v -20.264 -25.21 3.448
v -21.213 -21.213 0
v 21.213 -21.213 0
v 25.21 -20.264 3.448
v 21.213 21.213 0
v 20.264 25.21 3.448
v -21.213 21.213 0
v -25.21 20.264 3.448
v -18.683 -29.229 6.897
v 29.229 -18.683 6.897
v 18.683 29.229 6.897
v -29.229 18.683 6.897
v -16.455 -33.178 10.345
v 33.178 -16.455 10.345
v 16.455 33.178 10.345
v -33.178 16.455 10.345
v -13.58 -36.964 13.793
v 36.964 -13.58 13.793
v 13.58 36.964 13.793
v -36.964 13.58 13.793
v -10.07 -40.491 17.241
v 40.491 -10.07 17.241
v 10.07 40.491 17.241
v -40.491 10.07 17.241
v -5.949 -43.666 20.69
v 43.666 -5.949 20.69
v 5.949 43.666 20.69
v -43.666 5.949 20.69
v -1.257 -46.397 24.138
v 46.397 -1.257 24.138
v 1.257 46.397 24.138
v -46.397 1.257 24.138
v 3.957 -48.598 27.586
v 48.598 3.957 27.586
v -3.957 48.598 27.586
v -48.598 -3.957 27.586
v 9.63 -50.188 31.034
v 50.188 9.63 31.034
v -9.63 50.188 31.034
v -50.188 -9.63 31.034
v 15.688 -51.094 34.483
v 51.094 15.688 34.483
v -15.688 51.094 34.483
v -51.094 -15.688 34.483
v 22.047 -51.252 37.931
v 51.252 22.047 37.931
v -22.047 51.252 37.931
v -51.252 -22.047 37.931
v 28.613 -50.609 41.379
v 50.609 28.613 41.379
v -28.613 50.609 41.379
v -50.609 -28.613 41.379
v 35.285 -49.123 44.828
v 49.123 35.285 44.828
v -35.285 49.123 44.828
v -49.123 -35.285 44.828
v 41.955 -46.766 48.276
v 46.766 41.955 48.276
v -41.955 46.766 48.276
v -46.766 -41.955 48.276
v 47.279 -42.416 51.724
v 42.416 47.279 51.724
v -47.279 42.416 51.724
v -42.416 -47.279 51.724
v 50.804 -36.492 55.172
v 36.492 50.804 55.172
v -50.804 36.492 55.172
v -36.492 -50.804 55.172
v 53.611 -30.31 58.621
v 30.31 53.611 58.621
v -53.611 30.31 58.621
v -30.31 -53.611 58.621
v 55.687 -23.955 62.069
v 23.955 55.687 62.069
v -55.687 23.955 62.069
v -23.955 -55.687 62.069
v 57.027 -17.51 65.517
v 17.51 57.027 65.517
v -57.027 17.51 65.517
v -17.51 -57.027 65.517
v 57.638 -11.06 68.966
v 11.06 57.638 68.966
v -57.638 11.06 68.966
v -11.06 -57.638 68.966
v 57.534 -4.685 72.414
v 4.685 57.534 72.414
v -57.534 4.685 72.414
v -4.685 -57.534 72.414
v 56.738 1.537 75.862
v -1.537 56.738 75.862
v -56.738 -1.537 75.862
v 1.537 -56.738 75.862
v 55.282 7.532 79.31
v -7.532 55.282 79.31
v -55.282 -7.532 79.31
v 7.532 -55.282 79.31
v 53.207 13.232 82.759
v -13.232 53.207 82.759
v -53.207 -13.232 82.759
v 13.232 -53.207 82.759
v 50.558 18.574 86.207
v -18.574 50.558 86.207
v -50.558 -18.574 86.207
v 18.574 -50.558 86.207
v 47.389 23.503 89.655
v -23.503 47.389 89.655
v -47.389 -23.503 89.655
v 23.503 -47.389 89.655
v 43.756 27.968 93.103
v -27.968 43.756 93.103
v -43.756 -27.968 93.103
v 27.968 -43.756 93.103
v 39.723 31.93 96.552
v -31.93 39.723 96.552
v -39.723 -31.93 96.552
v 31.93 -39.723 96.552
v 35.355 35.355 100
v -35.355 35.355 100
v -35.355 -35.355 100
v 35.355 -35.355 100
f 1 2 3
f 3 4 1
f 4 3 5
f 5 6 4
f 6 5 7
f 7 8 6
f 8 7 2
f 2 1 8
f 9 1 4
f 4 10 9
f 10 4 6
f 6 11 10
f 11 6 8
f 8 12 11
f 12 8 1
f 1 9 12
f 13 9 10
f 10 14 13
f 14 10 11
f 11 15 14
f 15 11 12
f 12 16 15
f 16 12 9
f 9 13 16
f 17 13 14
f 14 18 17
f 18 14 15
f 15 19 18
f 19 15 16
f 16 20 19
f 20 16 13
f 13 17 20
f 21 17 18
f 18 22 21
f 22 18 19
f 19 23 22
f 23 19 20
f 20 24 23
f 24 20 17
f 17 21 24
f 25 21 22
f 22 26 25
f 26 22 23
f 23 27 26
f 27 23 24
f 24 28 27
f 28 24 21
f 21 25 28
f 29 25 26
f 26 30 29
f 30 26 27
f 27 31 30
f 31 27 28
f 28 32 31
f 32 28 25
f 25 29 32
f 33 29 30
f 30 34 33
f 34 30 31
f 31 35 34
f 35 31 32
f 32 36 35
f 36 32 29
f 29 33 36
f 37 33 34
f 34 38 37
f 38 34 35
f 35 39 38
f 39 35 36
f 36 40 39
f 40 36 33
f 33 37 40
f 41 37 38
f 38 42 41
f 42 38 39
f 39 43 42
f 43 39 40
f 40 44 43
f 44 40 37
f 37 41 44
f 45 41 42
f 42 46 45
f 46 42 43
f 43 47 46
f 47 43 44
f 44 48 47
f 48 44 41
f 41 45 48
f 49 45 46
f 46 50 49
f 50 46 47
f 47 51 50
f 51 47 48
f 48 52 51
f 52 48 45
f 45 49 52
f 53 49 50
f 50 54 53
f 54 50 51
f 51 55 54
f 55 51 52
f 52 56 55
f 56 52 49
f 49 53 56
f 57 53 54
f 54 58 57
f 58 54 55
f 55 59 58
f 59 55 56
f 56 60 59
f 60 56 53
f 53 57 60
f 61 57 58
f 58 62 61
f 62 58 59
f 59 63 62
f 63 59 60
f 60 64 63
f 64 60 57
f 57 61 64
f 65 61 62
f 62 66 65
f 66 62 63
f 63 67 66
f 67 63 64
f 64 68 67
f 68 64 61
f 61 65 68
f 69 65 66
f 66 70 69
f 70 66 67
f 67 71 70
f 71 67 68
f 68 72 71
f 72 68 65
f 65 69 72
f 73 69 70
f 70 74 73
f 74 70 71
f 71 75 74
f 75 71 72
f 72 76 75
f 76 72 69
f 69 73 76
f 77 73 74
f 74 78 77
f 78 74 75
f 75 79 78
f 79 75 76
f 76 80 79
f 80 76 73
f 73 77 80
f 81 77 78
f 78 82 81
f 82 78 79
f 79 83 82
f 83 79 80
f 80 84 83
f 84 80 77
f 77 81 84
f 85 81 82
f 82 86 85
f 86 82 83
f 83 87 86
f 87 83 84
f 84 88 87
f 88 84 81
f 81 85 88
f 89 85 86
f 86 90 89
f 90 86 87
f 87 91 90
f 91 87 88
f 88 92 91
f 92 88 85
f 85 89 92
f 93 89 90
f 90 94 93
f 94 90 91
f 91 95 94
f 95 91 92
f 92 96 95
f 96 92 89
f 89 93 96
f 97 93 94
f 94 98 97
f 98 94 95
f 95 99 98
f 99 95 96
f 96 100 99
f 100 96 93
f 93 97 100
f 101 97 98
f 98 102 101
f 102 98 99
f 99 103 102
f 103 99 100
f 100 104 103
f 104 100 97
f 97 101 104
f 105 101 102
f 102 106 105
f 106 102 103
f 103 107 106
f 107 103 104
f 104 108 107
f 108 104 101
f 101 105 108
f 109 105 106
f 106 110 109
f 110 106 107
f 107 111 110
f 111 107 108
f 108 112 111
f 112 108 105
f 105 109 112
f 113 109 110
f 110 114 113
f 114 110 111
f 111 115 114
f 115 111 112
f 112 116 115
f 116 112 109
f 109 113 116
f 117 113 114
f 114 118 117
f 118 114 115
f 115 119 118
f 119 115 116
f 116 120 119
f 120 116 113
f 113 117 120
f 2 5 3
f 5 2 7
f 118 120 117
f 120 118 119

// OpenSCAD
// The vase profile will range from the left edge of the drawing square (=center of vase) to the right side of the drawing.
rightHandProfile = [ [ [-35,-25],[-18,0],[-25,25] ], [[0,1,2]] ]; // [draw_polygon:100x100]
crossSection = [ [ [-25,-25], [25,-25], [25,25], [-25,25] ], [[0,1,2,3]] ]; // [draw_polygon:100x100]
twistAngle = 180;
numberOfSections = 30;
actualHeight = 100;
forceDegreesOfRotationalSymmetry = 1;
mirrorInXAxis = 0; //[0:No,1:Yes]

module end_of_parameters_dummy() {}


//BEGIN: use <tubemesh.scad>

//BEGIN: use <eval.scad>;
function _isString(v) = v >= "";
function _isVector(v) = !(v>="") && len(v) != undef;
function _isFloat(v) = v+0 != undef;

function _substr(s, start=0, stop=undef, soFar = "") =
    start >= (stop==undef ? len(s) : stop) ? soFar :
        _substr(s, start=start+1, stop=stop, soFar=str(soFar, s[start]));

function _parseInt(s, start=0, stop=undef, accumulated=0) =
    let( stop = stop==undef ? len(s) : stop )
        start >= stop ? accumulated :
        s[start] == "+" ? _parseInt(s, start=start+1, stop=stop) :
        s[start] == "-" ? -_parseInt(s, start=start+1, stop=stop) :
        let (digit = search(s[start], "0123456789"))
            digit == [] ? 0 : _parseInt(s, start=start+1, stop=stop, accumulated=accumulated*10+digit[0]);

function _findNonDigit(s, start=0) =
    start >= len(s) || s[start]<"0" || s[start]>"9" ? start :
    _findNonDigit(s, start=start+1);

function _replaceChar(s,c1,c2,pos=0,soFar="") =
    pos >= len(s) ? soFar :
    _replaceChar(s,c1,c2,pos=pos+1,soFar=str(soFar, s[pos]==c1 ? c2 : s[pos]));

function _parseUnsignedFloat(s) =
    len(s) == 0 ? 0 :
        let(
            firstNonDigit = _findNonDigit(s),
            decimalPart = s[firstNonDigit]!="." ?
                [firstNonDigit,firstNonDigit] : [firstNonDigit+1, _findNonDigit(s, start=firstNonDigit+1)],
            intPart = _parseInt(s,start=0,stop=firstNonDigit),
            fractionPart = _parseInt(s,start=decimalPart[0],stop=decimalPart[1]),
            baseExp = s[decimalPart[1]]=="e" || s[decimalPart[1]]=="E" ? pow(10,_parseInt(s, start=decimalPart[1]+1)) : 1)
            (intPart+fractionPart*pow(10,-(decimalPart[1]-decimalPart[0])))*baseExp;

function _tail(v) = len(v)>=2 ? [for(i=[1:len(v)-1]) v[i]] : [];
function _isspace(c) = (" " == c || "\t" == c || "\r" == c || "\n" == c );
function _isdigit(c) = ("0" <= c && c <= "9" );
function _isalpha(c) = ("a" <= c && c <= "z") || ("A" <= c && c <= "Z");
function _isalpha_(c) = _isalpha(c)  || c=="_";
function _isalnum_(c) = _isalpha(c) || _isdigit(c) || c=="_";
function _flattenLists(ll) = [for(a=ll) for(b=a) b];

function _spaceSequence(s, start=0, count=0) =
    len(s)>start && _isspace(s[start]) ? _spaceSequence(s, start=start+1, count=count+1) : count;
function _digitSequence(s, start=0, count=0) =
    len(s)>start && _isdigit(s[start]) ? _digitSequence(s, start=start+1,count=count+1) : count;
function _alnum_Sequence(s, start=0, count=0) =
    len(s)>start && _isalnum_(s[start]) ? _alnum_Sequence(s, start=start+1,count=count+1) : count;
function _identifierSequence(s, start=0, count=0) =
    len(s)>start && _isalpha_(s[start]) ? _alnum_Sequence(s, start=start+1, count=count+1) : count;
function _signedDigitSequence(s, start=0) =
    len(s) <= start ? 0 :
        (s[start] == "+" || s[start] == "-" ) ? 1+_digitSequence(s,start=start+1) : _digitSequence(s,start=start);
function _realStartingWithDecimal(s, start=0) =
    len(s)>start && s[start] == "." ?
        let(next = start+1+_digitSequence(s, start=start+1))
        (s[next] == "e" || s[next] == "E" ?
            next-start+1+_signedDigitSequence(s, start=next+1) : next-start)
        : 0;
function _realContinuation(s, start=0) =
    len(s) <= start ? 0 :
        let(c1=_realStartingWithDecimal(s, start=start))
        c1 > 0 ? c1 :
        s[start] == "e" || s[start] == "E" ?
            1+_signedDigitSequence(s, start=start+1) : 0;
function _positiveRealSequence(s, start=0) =
    len(s) <= start ? 0 :
        let(c1 = _realStartingWithDecimal(s, start=start))
            c1 > 0 ? c1 :
        let(c2 = _digitSequence(s, start=start))
            c2 > 0 ? c2 + _realContinuation(s, start=start+c2) : 0;

_multiSymbolOperators = [ "<=", ">=", "==", "&&", "||" ]; // must be in order of decreasing length

function _multiSymbolOperatorSequence(s, start=0) =
    (s[start]=="<" && s[start+1]=="=") ||
    (s[start]==">" && s[start+1]=="=") ||
    (s[start]=="=" && s[start+1]=="=") ||
    (s[start]=="!" && s[start+1]=="=") ||
    (s[start]=="&" && s[start+1]=="&") ||
    (s[start]=="|" && s[start+1]=="|") ? 2 : 0;

function _tokenize(s, start=0) =
    start >= len(s) ? [] :
    let(c1=_spaceSequence(s, start=start)) c1>0 ?
        concat([" "], _tokenize(s, start=start+c1)) :
    let(c2=_identifierSequence(s, start=start)) c2>0 ?
        concat([_substr(s, start=start, stop=start+c2)], _tokenize(s, start=start+c2)) :
    let(c3=_positiveRealSequence(s, start=start)) c3>0 ?
        concat([_substr(s, start=start, stop=start+c3)], _tokenize(s, start=start+c3)) :
    let(c4=_multiSymbolOperatorSequence(s, start=start)) c4>0 ?
        concat([_substr(s, start=start, stop=start+c4)], _tokenize(s, start=start+c4)) :
        concat([s[start]], _tokenize(s, start=start+1));


function _endParens(list,start=0,openCount=0,stop=undef) =
    let(stop = stop==undef ? len(list) : stop)
    start >= stop ? (openCount?undef:stop) :
    list[start][0] == ")" ?
            (openCount==1 ? start+1 : _endParens(list,start+1,stop=stop, openCount=openCount-1)) :
    _endParens(list,start+1,stop=stop, openCount=
        list[start][0] == "(" ?
            openCount+1 : openCount);

function _indexInTable(string, table, column=0) =
    let (s=search([string], table, index_col_num=column))
        s[0] == [] ? -1 : s[0][0];

_NAME = 0;
_ARITY = 1;
_PREC = 2;
_ASSOC_DIR = 3;
_ARGUMENTS_FROM_VECTOR = 4;
_OPERATOR = 5;
_EXTRA_DATA = 6;

function _func(op) = [ op, 1, -1, 1, true, op ];

_operators = [
    [ "[", 1, -1, 1, true, "[" ],
    [ "pow", 1, -1, 1, true, "^" ],
    [ "cross", 1, -1, 1, true, "cross" ],
    _func("sqrt"),
    _func("cos"),
    _func("sin"),
    _func("tan"),
    _func("acos"),
    _func("asin"),
    _func("atan"),
    _func("COS"),
    _func("SIN"),
    _func("TAN"),
    _func("ACOS"),
    _func("ASIN"),
    _func("ATAN"),
    _func("abs"),
    _func("ceil"),
    _func("exp"),
    _func("floor"),
    _func("ln"),
    _func("log"),
    _func("round"),
    _func("sign"),
    _func("norm"),
    [ "atan2", 1, -1, 1, true, "atan2" ],
    [ "ATAN2", 1, -1, 1, true, "ATAN2" ],
    [ "max", 1, -1, 1, true, "max" ],
    [ "min", 1, -1, 1, true, "min" ],
    [ "concat", 1, -1, 1, true, "concat" ],
    [ "#", 2, 0, -1, false, "#" ],
    [ "^", 2, 0, -1, false, "^" ],
    [ "#-",1, 0.5, 0, true, "-" ],
    [ "#+",1, 0.5, 0, true, "+" ],
    [ "*", 2, 1, 1, false, "*" ],
    [ "/", 2, 1, 1, false, "/" ],
    [ "%", 2, 1, 1, false, "%" ],
    [ "+", 2, 2, 1, true, "+" ],
    [ "-", 2, 2, 1, true, "-" ],
    [ "!=", 2, 3, 1, true, "!=" ],
    [ "==", 2, 3, 1, true, "==" ],
    [ "<=", 2, 3, 1, true, "<=" ],
    [ ">=", 2, 3, 1, true, ">=" ],
    [ "<", 2, 3, 1, true, "<" ],
    [ ">", 2, 3, 1, true, ">" ],
    [ "!", 1, 4, 1, true, "!" ],
    [ "&&", 2, 5, 1, true, "&&" ],
    [ "||", 2, 5, 1, true, "||" ],
    [ "?", 2, 10, -1, true, "?" ],
    [ ":", 2, 10, -1, true, ":" ],
    [ "=", 2, 30, 1, true, "=" ], // for let()
    [ "let", 1, 25, 1, true, "let" ],
    [ ",", 2, 100, 1, true, "," ]
   ];

_binary_or_unary = [ ["-", "#-"], ["+", "#+"], ["#", "["] ];

// insert parentheses in some places to tweak the order of
// operations in those contexts
function _fixBrackets(pretok,start=0) =
    start >= len(pretok) ? [] :
    pretok[start] == "[" ?
        concat(["#", "("], _fixBrackets(pretok,start=start+1)) :
    pretok[start] == "]" ?
        concat([")"], _fixBrackets(pretok,start=start+1)) :
    pretok[start] == "?" ?
        concat([pretok[start],"("], _fixBrackets(pretok,start=start+1)) :
    pretok[start] == ":" ?
        concat([")",pretok[start]], _fixBrackets(pretok,start=start+1)) :
        concat(pretok[start], _fixBrackets(pretok,start=start+1));

// disambiguate operators that can be unary or binary
function _fixUnaries(pretok) =
    [ for (i=[0:len(pretok)-1])
         let (
            a = pretok[i],
            j=_indexInTable(a, _binary_or_unary))
            (0 <= j && (i == 0 || pretok[i-1] == "(" ||
                0 <= _indexInTable(pretok[i-1], _operators)))? _binary_or_unary[j][1] : a ];

function _fixLet1(tok, start=0, stop=undef) =
    let (stop = stop==undef ? len(tok) : stop)
        start >= stop ? [] :
        tok[start][0] == "let"?
           let(endP=_endParens(tok,start=start+1,stop=stop,openCount=0)) concat([concat(tok[start], [_fixLet1(tok,start=start+2,stop=endP-1)])], _fixLet1(tok,start=endP,stop=stop)) :
        concat([tok[start]], _fixLet1(tok,start=start+1,stop=stop));

function _parsePass1(s) =
    let (pretok=_fixUnaries(_fixBrackets(_tokenize(s))))
    _fixLet1(
    [ for (i=[0:len(pretok)-1])
        let (a=pretok[i])
        if (a[0] != " ")
            let (j=_indexInTable(a, _operators))
                j >= 0 ? _operators[j] : [a] ] );

function _prec(op1, pos1, op2, pos2) =
    op1 != undef && op2 == undef ? false :
    op1 == undef && op2 != undef ? true :
    op1 == undef && op2 == undef ? true :
    op1[_ARITY] == 1 && pos1 > pos2 ? true :
    op2[_ARITY] == 1 && pos2 > pos1 ? false :
    op1[_PREC] < op2[_PREC] ? true :
        op2[_PREC] < op1[_PREC] ? false :
            op1[_ASSOC_DIR] * pos1 < op2[_ASSOC_DIR] * pos2;

function _parseLiteralOrVariable(s) =
        s == "PI" ? PI :
        s == "true" ? true :
        s == "false" ? false :
        s == "undef" ? undef :
        _isalpha_(s[0]) ? s :
        _parseUnsignedFloat(s);

function _isoperator(token) = _PREC<len(token);

function _getCandidatesForMainOperator(tok,start,stop) =
   start >= stop ? [] :
   tok[start][0] == "(" ?
        _getCandidatesForMainOperator(tok,_endParens(tok,start=start+1,stop=stop,openCount=1),stop)
        :
        _isoperator(tok[start]) ? concat([[tok[start],start]],_getCandidatesForMainOperator(tok,start+1,stop)) :
        _getCandidatesForMainOperator(tok,start+1,stop);

// Find the operator with least precedence
function _findMainOperatorPos(candidates,start=0) =
    len(candidates) <= start ? undef :
    let(rest=_findMainOperatorPos(candidates,start+1))
    _prec(candidates[rest][0], rest, candidates[start][0], start) ? start : rest;

function _firstOccurrence(c,opName,start=0) =
    start >= len(c) ? undef :
    c[start][0][0] == opName ? c[start] :
        _firstOccurrence(c,opName,start=start+1);

// We know the main operator is a ? or a :. We now need to find out which.
function _mainQuestionOperator(c) =
    let(fq = _firstOccurrence(c,"?"),
        fc = _firstOccurrence(c,":"))
        fq[1] != undef && (fc[1] == undef || fq[1] < fc[1]) ? fq : fc;

function _mainOperator(tok,start,stop) =
    let(c=_getCandidatesForMainOperator(tok,start,stop),
        pos=_findMainOperatorPos(c),
        m=c[pos])
        m[0][0] == "?" ?
            concat(m, [_firstOccurrence(c,":",start=pos+1)[1]])
            : m;

function _doLets(assignments, final, start=0) =
    start >= len(assignments) ? final :
    assignments[start][0] == "=" ? ["let", ["'", assignments[start][1]], assignments[start][2], _doLets(assignments, final, start=start+1)] : _doLets(assignments, final, start=start+1);

function _letOperator(a,b) =
    let(rawAssignments=_fixCommas(a),
        assignments=rawAssignments[0] == "[[" ?
            _tail(rawAssignments) : [a])
    _doLets(assignments, b);

/* This takes a fully tokenized vector, each element of which is either a line from the _operators table or a vector containing a single non-operator string, and parses it using general parenthesis and operator parsing. Comma expressions for building vectors will be parsed in the next pass. */
function _parseMain(tok,start=0,stop=undef) =
    let( stop= stop==undef ? len(tok) : stop )
        stop <= start ? undef :
        tok[start][0] == "(" && _endParens(tok,start=start+1,stop=stop,openCount=1)==stop ?
            _parseMain(tok,start=start+1,stop=stop-1) :
        let( lp = _mainOperator(tok,start,stop) )
            lp[0] == undef ? ( stop-start>1 ? undef : _parseLiteralOrVariable(tok[start][0]) ) :
            let( op = lp[0], pos = lp[1] )
                op[_NAME] == "?" ?
                    [ op[_OPERATOR], _parseMain(tok,start=start,stop=pos), _parseMain(tok,start=pos+1,stop=lp[2]), _parseMain(tok,start=lp[2]+1,stop=stop) ] :
                op[_NAME] == "let" ?
                    _letOperator( _parseMain(op[_EXTRA_DATA]), _parseMain(tok,start=pos+1,stop=stop)) :
                op[_ARITY] == 2 ?
                    (start==pos ?
                    /* unary */

                    let(j=_indexInTable(op[_OPERATOR], _binary_or_unary)) [ _binary_or_unary[j][1],_parseMain(tok,start=pos+1,stop=stop)] : [ op[_OPERATOR], _parseMain(tok,start=start,stop=pos), _parseMain(tok,start=pos+1,stop=stop)])
                    : [ op[_OPERATOR], _parseMain(tok,start=pos+1,stop=stop) ];


// this upgrades sequences of binary commas to vectors
function _fixCommas(expression) =
    expression[0] == "," ?
        let(a=_fixCommas(expression[1]),
            b=_fixCommas(expression[2]))
            a[0] == "[[" ?
                concat(["[["],concat(_tail(a), [b])) :
                ["[[",a,b]
        :
    _isVector(expression) ?
            concat([expression[0]], [for (i=[1:len(expression)-1]) _fixCommas(expression[i])]) :
            expression;

// fix arguments from vectors
function _fixArguments(expression) =
    let(i=_indexInTable(expression[0], _operators, _OPERATOR))
            i >=0 && _operators[i][_ARGUMENTS_FROM_VECTOR] && expression[1][0] == "[[" ? concat([expression[0]], [for (i=[1:len(expression[1])-1]) _fixArguments(expression[1][i])]) :
/*            expression[0] == "?" ?
                concat([expression[0],expression[1]],[for (i=[1:len(expression[2])-1]) _fixArguments(expression[2][i])]) : */
            len(expression)>1 && !_isString(expression) ?
                concat([expression[0]], [for (i=[1:len(expression)-1]) _fixArguments(expression[i])])
                    : expression;

function _optimizedLiteral(x) =
    len(x)==undef ? x : ["'", x];

function _wellDefined(x) =
    x==undef ? false :
    len(x)==undef ? true :
    x[0] == "'" ? true :
    len(x)==1 ? x[0]!=undef :
    len([for (a=x) if(!_wellDefined(a)) true])==0;

function _optimize(expression) =
    let(x=eval(expression,$careful=true))
        _wellDefined(x) ? _optimizedLiteral(x) :
        expression[0] == "'" ? _optimizedLiteral(x) :
        ! _isString(expression) ?
            concat([expression[0]], [for(i=[1:len(expression)-1]) (i>1 || expression[0] != "let") ?  _optimize(expression[i]) : expression[i]]) :
        expression;

function compileFunction(expression,optimize=true) =
            _isVector(expression) ? expression :
            _isFloat(expression) ? expression :
            let(unoptimized = _fixArguments(_fixCommas(_parseMain(_parsePass1(expression)))))
        optimize ? _optimize(unoptimized) : unoptimized;

function evaluateFunction(expression,variables) = eval(compileFunction(expression,optimize=false),variables);

function _let(v, var, value) = concat([var, value], v);

function _lookupVariable(var, table) =
    let (s=search([var], table, index_col_num=0))
        s[0] == [] ? undef : table[s[0][0]][1];

function _generate(var, range, expr, v) =
    [ for(i=range) eval(expr, _let(v, var, i)) ];

function _safeNorm(v) =
    ! _isVector(v) || len([for (x=v) x+0==undef]) ? undef : norm(v);

function eval(c,v=[]) =
    ""<=c ? _lookupVariable(c,v) :
    let(op=c[0]) (
    op == undef ? c :
    op == "'" ? c[1] :
    op == "+" ? (len(c)==2 ? eval(c[1],v) : eval(c[1],v)+eval(c[2],v)) :
    op == "-" ? (len(c)==2 ? -eval(c[1],v) : eval(c[1],v)-eval(c[2],v)) :
    op == "*" ? eval(c[1],v)*eval(c[2],v) :
    op == "/" ? eval(c[1],v)/eval(c[2],v) :
    op == "%" ? eval(c[1],v)%eval(c[2],v) :
    op == "sqrt" ? sqrt(eval(c[1],v)) :
    op == "^" || op == "pow" ? pow(eval(c[1],v),eval(c[2],v)) :
    op == "cos" ? cos(eval(c[1],v)) :
    op == "sin" ? sin(eval(c[1],v)) :
    op == "tan" ? tan(eval(c[1],v)) :
    op == "acos" ? acos(eval(c[1],v)) :
    op == "asin" ? asin(eval(c[1],v)) :
    op == "atan" ? atan(eval(c[1],v)) :
    op == "atan2" ? atan2(eval(c[1],v),eval(c[2],v)) :
    op == "COS" ? cos(eval(c[1],v)*180/PI) :
    op == "SIN" ? sin(eval(c[1],v)*180/PI) :
    op == "TAN" ? tan(eval(c[1],v)*180/PI) :
    op == "ACOS" ? acos(eval(c[1],v))*PI/180 :
    op == "ASIN" ? asin(eval(c[1],v))*PI/180 :
    op == "ATAN" ? atan(eval(c[1],v))*PI/180 :
    op == "ATAN2" ? atan2(eval(c[1],v),eval(c[2],v))*PI/180 :
    op == "abs" ? abs(eval(c[1],v)) :
    op == "ceil" ? ceil(eval(c[1],v)) :
    op == "cross" ? cross(eval(c[1],v),eval(c[2],v)) :
    op == "exp" ? exp(eval(c[1],v)) :
    op == "floor" ? floor(eval(c[1],v)) :
    op == "ln" ? ln(eval(c[1],v)) :
    op == "len" ? len(eval(c[1],v)) :
    op == "log" ? log(eval(c[1],v)) :
    op == "max" ? (len(c) == 2 ? max(eval(c[1],v)) : max([for(i=[1:len(c)-1]) eval(c[i],v)])) :
    op == "min" ? (len(c) == 2 ? min(eval(c[1],v)) : min([for(i=[1:len(c)-1]) eval(c[i],v)])) :
    op == "norm" ?
        (!$careful ? norm(eval(c[1],v)) : _safeNorm(eval(c[1],v))) :
    op == "rands" ? rands(eval(c[1],v),eval(c[2],v),eval(c[3],v),eval(c[4],v)) :
    op == "round" ? round(eval(c[1],v)) :
    op == "sign" ? sign(eval(c[1],v)) :
    op == "[" ? [for (i=[1:len(c)-1]) eval(c[i],v)] :
    op == "#" ? eval(c[1],v)[eval(c[2],v)] :
    op == "<" ? eval(c[1],v)<eval(c[2],v) :
    op == "<=" ? eval(c[1],v)<=eval(c[2],v) :
    op == ">=" ? eval(c[1],v)>=eval(c[2],v) :
    op == ">" ? eval(c[1],v)>=eval(c[2],v) :
    op == "==" ? (!$careful ? eval(c[1],v)==eval(c[2],v) :
        (let(c1=eval(c[1],v))
        c1==undef ? undef :
        let(c2=eval(c[2],v))
        c2==undef ? undef :
        c1 == c2) ) :
    op == "!=" ? (!$careful ? eval(c[1],v)!=eval(c[2],v) :
        (let(c1=eval(c[1],v))
        c1==undef ? undef :
        let(c2=eval(c[2],v))
        c2==undef ? undef :
        c1 != c2) ) :
    op == "&&" ? (!$careful ? eval(c[1],v)&&eval(c[2],v) :
        (let(c1=eval(c[1],v))
        c1==undef ? undef :
        !c1 ? false :
        let(c2=eval(c[2],v))
        c2==undef ? undef :
        c1 && c2) ) :
    op == "||" ? (!$careful ? eval(c[1],v)||eval(c[2],v) :
        (let(c1=eval(c[1],v))
        c1==undef ? undef :
        c1 ? true :
        let(c2=eval(c[2],v))
        c2==undef ? undef :
        c1 || c2) ) :
    op == "!" ? (!$careful ? !eval(c[1],v) :
        (let(c1=eval(c[1],v))
        c1==undef ? undef :
        !c1) ) :
    op == "?" ? (!$careful ? (eval(c[1],v)?eval(c[2],v):eval(c[3],v)) :
        (let(c1=eval(c[1],v))
        c1==undef ? undef :
        c1 ? eval(c[2],v):eval(c[3],v)) ):

    op == "concat" ? [for (i=[1:len(c)-1]) let(vect=eval(c[i],v)) for(j=[0:len(vect)-1]) vect[j]] :
    op == "range" ? (len(c)==3 ? [eval(c[1],v):eval(c[2],v)] : [eval(c[1],v):eval(c[2],v):eval(c[3],v)]) :
    op == "let" ? (!$careful ? eval(c[3],concat([[eval(c[1],v),eval(c[2],v)]], v)) :
            let(c1=eval(c[1],v),c2=eval(c[2],v))
                c1==undef || c2==undef ? undef :
                    eval(c[3],concat([[c1,c2]], v)) ) :
    op == "gen" ? _generate(eval(c[1],v),eval(c[2],v),c[3],v) :
    undef
    );

// per 10,000 operations with "x^3*y-x*y^3"
// 24 sec compile
// 21 sec unoptimized compile
// 22 sec evaluateFunction()
// 0.7 sec eval

// pass1 10 seconds [tokenize: 4 seconds]
// parseMain 6
// fixCommas 0
// fixArguments 3
// optimize 3
/*
echo(compileFunction("x^(2*3)"));
fc = compileFunction("x^3*y-x*y^3",optimize=true);
echo(fc);
echo(eval(fc,[["x",1],["y",1]]));
z=[for(i=[0:9999]) compileFunction("x^3*y-x*y^3",optimize=false)];//fc,[ ["x",1],["y",2] ])];
*/

//z = [for(i=[1:10000]) compileFunction("x^3*y-x*y^3")];
// normal: 23

//function repeat(s, copies, soFar="") = copies <= 0 ? soFar : repeat(s, copies-1, soFar=str(soFar,s));

//END: use <eval.scad>;


// params = [sections,sectionCounts]

// written for tail-recursion
// _subtotals[i] = list[0] + ... + list[i-1]
function _subtotals(list,soFar=[]) =
        len(soFar) >= 1+len(list) ? soFar :
        _subtotals(list,
            let(n1=len(soFar))
            concat(soFar, n1>0 ? soFar[n1-1]+list[n1-1] : 0));

function _flatten(list) = [for (a=list) for(b=a) b];

function _reverseTriangle(t) = [t[2], t[1], t[0]];

// smallest angle in triangle
function _minAngle(p1,p2,p3) =
    let(a = p2-p1,
        b = p3-p1,
        c = p3-p2,
        v1 = a*b,
        v2 = -(c*a))
        v1 == 0 || v2 == 0 ? 0 :
        let( na = norm(a),
             a1 = acos(v1 / (na*norm(b))),
             a2 = acos(v2 / (na*norm(c))) )
        min(a1,a2,180-(a1+a2));

// triangulate square to maximize smallest angle
function _doSquare(points,i11,i21,i22,i12,optimize=true) =
    points[i11]==points[i12] ? [[i11,i21,i22]] :
    points[i21]==points[i22] ? [[i22,i12,i11]] :
    !optimize ? [[i11,i21,i22], [i22,i12,i11]] :
    let (m1 = min(_minAngle(points[i11],points[i21],points[i22]), _minAngle(points[i22],points[i12],points[i11])),
        m2 = min(_minAngle(points[i11],points[i21],points[i12]),
                _minAngle(points[i21],points[i22],points[i12])) )
        m2 <= m1 ? [[i11,i21,i22], [i22,i12,i11]] :
                  [[i11,i21,i12], [i21,i22,i12]];

/*
function _inTriangle(v1,t) = (v1==t[0] || v1==t[1] || v1==t[2]);

function _findTheDistinctVertex(t1,t2) =
    let(in = [for(i=[0:2]) _inTriangle(t1[i],t2)])
    ! in[0] && in[1] && in[2] ? 0 :
    ! in[1] && in[0] && in[2] ? 1 :
    ! in[2] && in[0] && in[1] ? 2 :
    undef;

// make vertex i come first
function _rotateTriangle(t,i) =
    [for (j=[0:2]) t[(j+i)%3]];

function _optimize2Triangles(points,t1,t2) =
    let(i1 = _findTheDistinctVertex(t1,t2))
    i1 == undef ? [t1,t2] :
    let(i2 = _findTheDistinctVertex(t2,t1))
    i2 == undef ? [t1,t2] :
    let(t1 = _rotateTriangle(t1,i1),
        t2 = _rotateTriangle(t2,i2))
    _doSquare(points,t1[1],t2[0],t2[1],t1[0],optimize=true);

// a greedy optimization for a strip of triangles most of which adjoin one another; written for tail-recursion
function _optimizeTriangles(points,triangles,position=0,optimize=true,iterations=4) =
        !optimize || position >= iterations*len(triangles) ? triangles :
            _optimizeTriangles(points,
                let(
                    n = len(triangles),
                    position1=position%n,
                    position2=(position+1)%n,
                    opt=_optimize2Triangles(points,triangles[position1],triangles[position2]))
                    [for (i=[0:len(triangles)-1])
                        i == position1 ? opt[0] :
                        i == position2 ? opt[1] :
                            triangles[i]],
                position=position+1);
*/

function _removeEmptyTriangles(points,triangles) =
    [for(t=triangles)
        if(true || points[t[0]] != points[t[1]] && points[t[1]] != points[t[2]] && points[t[2]] != points[t[0]]) t];

// n1 and n2 should be fairly small, so this doesn't need
// tail-recursion
// this assumes n1<=n2
function _tubeSegmentTriangles(points,index1,n1,index2,n2,i=0,soFar=[],optimize=true)
    = i>=n2 ? _removeEmptyTriangles(points,soFar) :
            let(i21=i,
                i22=(i+1)%n2,
                i11=floor((i21)*n1/n2+0.5)%n1,
                i12=floor((i22)*n1/n2+0.5)%n1,
                add = i11==i12 ? [[index1+i11,index2+i21,index2+i22]] :
                    _doSquare(points,index1+i11,index2+i21,index2+i22,index1+i12,optimize=optimize))
                _tubeSegmentTriangles(points,index1,n1,index2,n2,i=i+1,soFar=concat(soFar,add),optimize=optimize);

function _tubeSegmentFaces(points,index,n1,n2,optimize=true)
    = n1<n2 ? _tubeSegmentTriangles(points,index,n1,index+n1,n2,optimize=optimize) :
        [for (f=_tubeSegmentTriangles(points,index+n1,n2,index,n1,optimize=optimize)) _reverseTriangle(f)];

function _tubeMiddleFaces(points,counts,subtotals,optimize=true) = [ for (i=[1:len(counts)-1])
           for (face=_tubeSegmentFaces(points,subtotals[i-1],counts[i-1],counts[i],optimize=optimize)) face ];

function _endCaps(counts,subtotals,startCap=true,endCap=true) =
    let( n = len(counts),
         cap1 = counts[0]<=2 || !startCap ? undef : [for(i=[0:counts[0]-1]) i],
         cap2 = counts[n-1]<=2 || !endCap ? undef : [for(i=[counts[n-1]-1:-1:0]) subtotals[n-1]+i] )
       [for (c=[cap1,cap2]) if (c!=undef) c];

function _tubeFaces(sections,startCap=true,endCap=true,optimize=true) =
                let(
        counts = [for (s=sections) len(s)],
        points = _flatten(sections),
        subtotals = _subtotals(counts))
            concat(_tubeMiddleFaces(points,counts,subtotals,optimize=optimize),_endCaps(counts,subtotals,startCap=true,endCap=true));

function _removeDuplicates1(points,soFar=[[],[]]) =
        len(soFar[0]) >= len(points) ? soFar :
            _removeDuplicates1(points,
               let(
                mapSoFar=soFar[0],
                pointsSoFar=soFar[1],
                j=len(mapSoFar),
                k=search([points[j]], pointsSoFar)[0])
                k == []? [concat(mapSoFar,[len(pointsSoFar)]),
                            concat(pointsSoFar,[points[j]])] :
                           [concat(mapSoFar,[k]),pointsSoFar]);

function _removeDuplicates(points, faces) =
    let(fix=_removeDuplicates1(points),
        map=fix[0],
        newPoints=fix[1],
        newFaces=[for(f=faces) [for(v=f) map[v]]])
            [newPoints, newFaces];

function pointsAndFaces(sections,startCap=true,endCap=true,optimize=true) =
        let(
            points0=_flatten(sections),
            faces0=_tubeFaces(sections,startCap=startCap,endCap=endCap,optimize=optimize))
        _removeDuplicates(points0,faces0);

function sectionZ(section,z) = [for(xy=section) [xy[0],xy[1],z]];

function shiftSection(section,delta) = [for(p=section) [for(i=[0:len(delta)-1]) (p[i]==undef?0:p[i])+delta[i]]];

module tubeMesh(sections,startCap=true,endCap=true,optimize=true) {
    pAndF = pointsAndFaces(sections,startCap=startCap,endCap=endCap,optimize=optimize);
    polyhedron(points=pAndF[0],faces=pAndF[1]);
}

// increase number of points from len(section) to n
function _interpolateSection(section,n) =
        let(m=len(section))
        n == m ? section :
        n < m ? undef :
            [for(i=[0:m-1])
                let(cur=floor(i*n/m),
                    k=floor((i+1)*n/m)-cur,
                    i2=(i+1)%m)
                    for(j=[0:k-1])
                        let(t=j/k)
                            section[i]*(1-t)+section[i2]*t];

function arcPoints(r=10,d=undef,start=0,end=180,z=undef) =
            let(r=d==undef?r:d/2,
                n=getPointsAround(abs(end-start)))
                    r*[for(i=[0:n])
                        let(angle=start+i*(end-start)/n) [cos(angle),sin(angle)]];

function ngonPoints(n=4,r=10,d=undef,rotate=0,z=undef) =
            let(r=d==undef?r:d/2)
            z==undef ?
            r*[for(i=[0:n-1]) let(angle=i*360/n+rotate) [cos(angle),sin(angle)]] :
            [for(i=[0:n-1]) let(angle=i*360/n+rotate) [r*cos(angle),r*sin(angle),z]];

function starPoints(n=10,r1=5,r2=10,rotate=0,z=undef) =
          z==undef ?
            [for(i=[0:2*n-1]) let(angle=i*180/n+rotate) (i%2?r1:r2) * [cos(angle),sin(angle)]] :
            [for(i=[0:2*n-1]) let(angle=i*180/n+rotate, r=i%2?r1:r2) [r*cos(angle),r*sin(angle),z]];

function roundedSquarePoints(size=[10,10],radius=2,z=undef) =
    let(n=$fn?$fn:32,
        x=len(size)>=2 ? size[0] : size,
        y=len(size)>=2 ? size[1] : size,
        centers=[[x-radius,y-radius],[radius,y-radius],[radius,radius],[x-radius,radius]],
        section=[for(i=[0:n-1])
            let(center=centers[floor(i*4/n)],
                angle=360*i/n)
            center+radius*[cos(angle),sin(angle)]])
        z==undef ? section : sectionZ(section,z);

function getPointsAround(radius, angle=360) =
    max(3, $fn ? ceil($fn*angle/360) :
        max(floor(0.5+angle/$fa), floor(0.5+2*radius*PI*angle/360/$fs)));

// warning: no guarantee of perfect convexity
module mySphere(r=10,d=undef) {
    GA = 2.39996322972865332 * 180 / PI;
    radius = d==undef ? r : d/2;
    pointsAround = getPointsAround(radius);
    numSlices0 = (pointsAround + pointsAround % 2)/2;
    numSlices = numSlices0 + (numSlices0%2);
    sections = radius*[for(i=[0:numSlices])
                    i == 0 ? [[0,0,-1]] :
                    i == numSlices ? [[0,0,1]] :
                    let(
                        lat = (i-numSlices/2)/(numSlices/2)*90,
                        z1 = sin(lat),
                        r1 = cos(lat),
                        count = max(3,floor(0.5 + pointsAround * abs(r1))))
                        ngonPoints(count,r=r1,z=z1)];
    data = pointsAndFaces(sections,optimize=false);
    polyhedron(points=data[0], faces=data[1]);
}

function twistSectionXY(section,theta) =
    [for (p=section) [for(i=[0:len(p)-1])
        i == 0 ? p[0]*cos(theta)-p[1]*sin(theta) :
        i == 1 ? p[0]*sin(theta)+p[1]*cos(theta) :
        p[i]]];

module morphExtrude(section1,section2,height=undef,twist=0,numSlices=10,curve="t",curveParams=[[]],startCap=true,endCap=true,optimize=false) {

    fc = compileFunction(curve);
    n = max(len(section1),len(section2));

    section1interp = _interpolateSection(section1,n);
    section2interp = _interpolateSection(section2,n);
    sections = height == undef ?
                      [for(i=[0:numSlices])
                        let(t=i/numSlices)
                        (1-t)*section1interp+t*section2interp] :
                      [for(i=[0:numSlices])
                        let(t=i/numSlices,
                            t1=eval(fc,concat([["t",t]],curveParams)),
                            theta = t*twist,
                            section=(1-t1)*section1interp+t1*section2interp)
                        twistSectionXY(sectionZ(section,height*t),theta)];

    tubeMesh(sections,startCap=startCap,endCap=endCap,optimize=false);
}

module cone(r=10,d=undef,height=10) {
    radius = d==undef ? r : d/2;
    pointsAround =
        $fn ? $fn :
        max(3, floor(0.5+360/$fa), floor(0.5+2*radius*PI/$fs));
    morphExtrude(ngonPoints(n=pointsAround,r=radius), [[0,0]], height=height,optimize=false);
}

module prism(base=[[0,0,0],[1,0,0],[0,1,0]], vertical=[0,0,1]) {
    morphExtrude(base,[for(v=base) v+vertical],numSlices=1);
}


//END: use <tubemesh.scad>



function findLowestY(path,pos=0,lowest=[-1,1e50]) =
    pos >= len(path) ? lowest :
    findLowestY(path,
        pos=pos+1,
        lowest=path[pos][1]<lowest[1] ? [pos,path[pos][1]] :       lowest);

// right-most curve from rightHandProfile
profile = [for (i=rightHandProfile[1][0]) rightHandProfile[0][i]];
np = len(profile);
lowest = findLowestY(profile);
lowestIndex = lowest[0];
lowestY = lowest[1];
highest = findLowestY(-profile);
highestIndex = highest[0];
highestY = -highest[1];

function angle(a,b) = let(ab=b-a) atan2(ab[1],ab[0]);

nextAngle = angle(profile[lowestIndex], profile[(lowestIndex+1+np)%np]);
prevAngle = angle(profile[lowestIndex], profile[(lowestIndex-1+np)%np]);
direction = nextAngle<prevAngle ? 1 : -1;

pointsInverted = direction > 0 ?
    let(adjHighestIndex = lowestIndex <= highestIndex ? highestIndex : highestIndex+np) [for(i=[lowestIndex:adjHighestIndex]) [profile[i%np][1],50+profile[i%np][0]]] :
    let(adjLowestIndex = highestIndex <= lowestIndex ? lowestIndex : lowestIndex+np,
    n = lowestIndex-highestIndex)
    [for(i=[0:n]) let(ii=lowestIndex-i) [profile[ii%np][1],50+profile[ii%np][0]]];

function findSegment(f,x,soFar=0) =
    soFar >= len(f) ? len(f)-1 :
    x <= f[soFar][0] ? max(0,soFar-1) :
    findSegment(f,x,soFar=soFar+1);

function interpolateFunction(f,x) =
    let(i=findSegment(f,x))
    (f[i+1][1]-f[i][1])/(f[i+1][0]-f[i][0])*(x-f[i][0])+f[i][1];

renorm = 1/max([for(c=crossSection[0]) norm(c)]);

module main(yMultiply=1) {
    for (crossIndices=crossSection[1]) {
        cross = [for(i=crossIndices) [crossSection[0][i][0],crossSection[0][i][1]*yMultiply]];
        sections = [for (i=[0:numberOfSections-1])
                let(t=i/(numberOfSections-1),
                    z=lowestY*(1-t)+highestY*t,
                    scale=renorm*interpolateFunction(pointsInverted,z))
                    twistSectionXY(sectionZ(scale*cross,z),t*twistAngle)];
        scale(actualHeight/(highestY-lowestY))
        translate([0,0,-lowestY])
        tubeMesh(sections);
    }
}

for (i=[0:forceDegreesOfRotationalSymmetry-1])
    rotate([0,0,i*360/forceDegreesOfRotationalSymmetry]) {
        main();
        if (mirrorInXAxis) {
            main(yMultiply=-1);
        }
}
